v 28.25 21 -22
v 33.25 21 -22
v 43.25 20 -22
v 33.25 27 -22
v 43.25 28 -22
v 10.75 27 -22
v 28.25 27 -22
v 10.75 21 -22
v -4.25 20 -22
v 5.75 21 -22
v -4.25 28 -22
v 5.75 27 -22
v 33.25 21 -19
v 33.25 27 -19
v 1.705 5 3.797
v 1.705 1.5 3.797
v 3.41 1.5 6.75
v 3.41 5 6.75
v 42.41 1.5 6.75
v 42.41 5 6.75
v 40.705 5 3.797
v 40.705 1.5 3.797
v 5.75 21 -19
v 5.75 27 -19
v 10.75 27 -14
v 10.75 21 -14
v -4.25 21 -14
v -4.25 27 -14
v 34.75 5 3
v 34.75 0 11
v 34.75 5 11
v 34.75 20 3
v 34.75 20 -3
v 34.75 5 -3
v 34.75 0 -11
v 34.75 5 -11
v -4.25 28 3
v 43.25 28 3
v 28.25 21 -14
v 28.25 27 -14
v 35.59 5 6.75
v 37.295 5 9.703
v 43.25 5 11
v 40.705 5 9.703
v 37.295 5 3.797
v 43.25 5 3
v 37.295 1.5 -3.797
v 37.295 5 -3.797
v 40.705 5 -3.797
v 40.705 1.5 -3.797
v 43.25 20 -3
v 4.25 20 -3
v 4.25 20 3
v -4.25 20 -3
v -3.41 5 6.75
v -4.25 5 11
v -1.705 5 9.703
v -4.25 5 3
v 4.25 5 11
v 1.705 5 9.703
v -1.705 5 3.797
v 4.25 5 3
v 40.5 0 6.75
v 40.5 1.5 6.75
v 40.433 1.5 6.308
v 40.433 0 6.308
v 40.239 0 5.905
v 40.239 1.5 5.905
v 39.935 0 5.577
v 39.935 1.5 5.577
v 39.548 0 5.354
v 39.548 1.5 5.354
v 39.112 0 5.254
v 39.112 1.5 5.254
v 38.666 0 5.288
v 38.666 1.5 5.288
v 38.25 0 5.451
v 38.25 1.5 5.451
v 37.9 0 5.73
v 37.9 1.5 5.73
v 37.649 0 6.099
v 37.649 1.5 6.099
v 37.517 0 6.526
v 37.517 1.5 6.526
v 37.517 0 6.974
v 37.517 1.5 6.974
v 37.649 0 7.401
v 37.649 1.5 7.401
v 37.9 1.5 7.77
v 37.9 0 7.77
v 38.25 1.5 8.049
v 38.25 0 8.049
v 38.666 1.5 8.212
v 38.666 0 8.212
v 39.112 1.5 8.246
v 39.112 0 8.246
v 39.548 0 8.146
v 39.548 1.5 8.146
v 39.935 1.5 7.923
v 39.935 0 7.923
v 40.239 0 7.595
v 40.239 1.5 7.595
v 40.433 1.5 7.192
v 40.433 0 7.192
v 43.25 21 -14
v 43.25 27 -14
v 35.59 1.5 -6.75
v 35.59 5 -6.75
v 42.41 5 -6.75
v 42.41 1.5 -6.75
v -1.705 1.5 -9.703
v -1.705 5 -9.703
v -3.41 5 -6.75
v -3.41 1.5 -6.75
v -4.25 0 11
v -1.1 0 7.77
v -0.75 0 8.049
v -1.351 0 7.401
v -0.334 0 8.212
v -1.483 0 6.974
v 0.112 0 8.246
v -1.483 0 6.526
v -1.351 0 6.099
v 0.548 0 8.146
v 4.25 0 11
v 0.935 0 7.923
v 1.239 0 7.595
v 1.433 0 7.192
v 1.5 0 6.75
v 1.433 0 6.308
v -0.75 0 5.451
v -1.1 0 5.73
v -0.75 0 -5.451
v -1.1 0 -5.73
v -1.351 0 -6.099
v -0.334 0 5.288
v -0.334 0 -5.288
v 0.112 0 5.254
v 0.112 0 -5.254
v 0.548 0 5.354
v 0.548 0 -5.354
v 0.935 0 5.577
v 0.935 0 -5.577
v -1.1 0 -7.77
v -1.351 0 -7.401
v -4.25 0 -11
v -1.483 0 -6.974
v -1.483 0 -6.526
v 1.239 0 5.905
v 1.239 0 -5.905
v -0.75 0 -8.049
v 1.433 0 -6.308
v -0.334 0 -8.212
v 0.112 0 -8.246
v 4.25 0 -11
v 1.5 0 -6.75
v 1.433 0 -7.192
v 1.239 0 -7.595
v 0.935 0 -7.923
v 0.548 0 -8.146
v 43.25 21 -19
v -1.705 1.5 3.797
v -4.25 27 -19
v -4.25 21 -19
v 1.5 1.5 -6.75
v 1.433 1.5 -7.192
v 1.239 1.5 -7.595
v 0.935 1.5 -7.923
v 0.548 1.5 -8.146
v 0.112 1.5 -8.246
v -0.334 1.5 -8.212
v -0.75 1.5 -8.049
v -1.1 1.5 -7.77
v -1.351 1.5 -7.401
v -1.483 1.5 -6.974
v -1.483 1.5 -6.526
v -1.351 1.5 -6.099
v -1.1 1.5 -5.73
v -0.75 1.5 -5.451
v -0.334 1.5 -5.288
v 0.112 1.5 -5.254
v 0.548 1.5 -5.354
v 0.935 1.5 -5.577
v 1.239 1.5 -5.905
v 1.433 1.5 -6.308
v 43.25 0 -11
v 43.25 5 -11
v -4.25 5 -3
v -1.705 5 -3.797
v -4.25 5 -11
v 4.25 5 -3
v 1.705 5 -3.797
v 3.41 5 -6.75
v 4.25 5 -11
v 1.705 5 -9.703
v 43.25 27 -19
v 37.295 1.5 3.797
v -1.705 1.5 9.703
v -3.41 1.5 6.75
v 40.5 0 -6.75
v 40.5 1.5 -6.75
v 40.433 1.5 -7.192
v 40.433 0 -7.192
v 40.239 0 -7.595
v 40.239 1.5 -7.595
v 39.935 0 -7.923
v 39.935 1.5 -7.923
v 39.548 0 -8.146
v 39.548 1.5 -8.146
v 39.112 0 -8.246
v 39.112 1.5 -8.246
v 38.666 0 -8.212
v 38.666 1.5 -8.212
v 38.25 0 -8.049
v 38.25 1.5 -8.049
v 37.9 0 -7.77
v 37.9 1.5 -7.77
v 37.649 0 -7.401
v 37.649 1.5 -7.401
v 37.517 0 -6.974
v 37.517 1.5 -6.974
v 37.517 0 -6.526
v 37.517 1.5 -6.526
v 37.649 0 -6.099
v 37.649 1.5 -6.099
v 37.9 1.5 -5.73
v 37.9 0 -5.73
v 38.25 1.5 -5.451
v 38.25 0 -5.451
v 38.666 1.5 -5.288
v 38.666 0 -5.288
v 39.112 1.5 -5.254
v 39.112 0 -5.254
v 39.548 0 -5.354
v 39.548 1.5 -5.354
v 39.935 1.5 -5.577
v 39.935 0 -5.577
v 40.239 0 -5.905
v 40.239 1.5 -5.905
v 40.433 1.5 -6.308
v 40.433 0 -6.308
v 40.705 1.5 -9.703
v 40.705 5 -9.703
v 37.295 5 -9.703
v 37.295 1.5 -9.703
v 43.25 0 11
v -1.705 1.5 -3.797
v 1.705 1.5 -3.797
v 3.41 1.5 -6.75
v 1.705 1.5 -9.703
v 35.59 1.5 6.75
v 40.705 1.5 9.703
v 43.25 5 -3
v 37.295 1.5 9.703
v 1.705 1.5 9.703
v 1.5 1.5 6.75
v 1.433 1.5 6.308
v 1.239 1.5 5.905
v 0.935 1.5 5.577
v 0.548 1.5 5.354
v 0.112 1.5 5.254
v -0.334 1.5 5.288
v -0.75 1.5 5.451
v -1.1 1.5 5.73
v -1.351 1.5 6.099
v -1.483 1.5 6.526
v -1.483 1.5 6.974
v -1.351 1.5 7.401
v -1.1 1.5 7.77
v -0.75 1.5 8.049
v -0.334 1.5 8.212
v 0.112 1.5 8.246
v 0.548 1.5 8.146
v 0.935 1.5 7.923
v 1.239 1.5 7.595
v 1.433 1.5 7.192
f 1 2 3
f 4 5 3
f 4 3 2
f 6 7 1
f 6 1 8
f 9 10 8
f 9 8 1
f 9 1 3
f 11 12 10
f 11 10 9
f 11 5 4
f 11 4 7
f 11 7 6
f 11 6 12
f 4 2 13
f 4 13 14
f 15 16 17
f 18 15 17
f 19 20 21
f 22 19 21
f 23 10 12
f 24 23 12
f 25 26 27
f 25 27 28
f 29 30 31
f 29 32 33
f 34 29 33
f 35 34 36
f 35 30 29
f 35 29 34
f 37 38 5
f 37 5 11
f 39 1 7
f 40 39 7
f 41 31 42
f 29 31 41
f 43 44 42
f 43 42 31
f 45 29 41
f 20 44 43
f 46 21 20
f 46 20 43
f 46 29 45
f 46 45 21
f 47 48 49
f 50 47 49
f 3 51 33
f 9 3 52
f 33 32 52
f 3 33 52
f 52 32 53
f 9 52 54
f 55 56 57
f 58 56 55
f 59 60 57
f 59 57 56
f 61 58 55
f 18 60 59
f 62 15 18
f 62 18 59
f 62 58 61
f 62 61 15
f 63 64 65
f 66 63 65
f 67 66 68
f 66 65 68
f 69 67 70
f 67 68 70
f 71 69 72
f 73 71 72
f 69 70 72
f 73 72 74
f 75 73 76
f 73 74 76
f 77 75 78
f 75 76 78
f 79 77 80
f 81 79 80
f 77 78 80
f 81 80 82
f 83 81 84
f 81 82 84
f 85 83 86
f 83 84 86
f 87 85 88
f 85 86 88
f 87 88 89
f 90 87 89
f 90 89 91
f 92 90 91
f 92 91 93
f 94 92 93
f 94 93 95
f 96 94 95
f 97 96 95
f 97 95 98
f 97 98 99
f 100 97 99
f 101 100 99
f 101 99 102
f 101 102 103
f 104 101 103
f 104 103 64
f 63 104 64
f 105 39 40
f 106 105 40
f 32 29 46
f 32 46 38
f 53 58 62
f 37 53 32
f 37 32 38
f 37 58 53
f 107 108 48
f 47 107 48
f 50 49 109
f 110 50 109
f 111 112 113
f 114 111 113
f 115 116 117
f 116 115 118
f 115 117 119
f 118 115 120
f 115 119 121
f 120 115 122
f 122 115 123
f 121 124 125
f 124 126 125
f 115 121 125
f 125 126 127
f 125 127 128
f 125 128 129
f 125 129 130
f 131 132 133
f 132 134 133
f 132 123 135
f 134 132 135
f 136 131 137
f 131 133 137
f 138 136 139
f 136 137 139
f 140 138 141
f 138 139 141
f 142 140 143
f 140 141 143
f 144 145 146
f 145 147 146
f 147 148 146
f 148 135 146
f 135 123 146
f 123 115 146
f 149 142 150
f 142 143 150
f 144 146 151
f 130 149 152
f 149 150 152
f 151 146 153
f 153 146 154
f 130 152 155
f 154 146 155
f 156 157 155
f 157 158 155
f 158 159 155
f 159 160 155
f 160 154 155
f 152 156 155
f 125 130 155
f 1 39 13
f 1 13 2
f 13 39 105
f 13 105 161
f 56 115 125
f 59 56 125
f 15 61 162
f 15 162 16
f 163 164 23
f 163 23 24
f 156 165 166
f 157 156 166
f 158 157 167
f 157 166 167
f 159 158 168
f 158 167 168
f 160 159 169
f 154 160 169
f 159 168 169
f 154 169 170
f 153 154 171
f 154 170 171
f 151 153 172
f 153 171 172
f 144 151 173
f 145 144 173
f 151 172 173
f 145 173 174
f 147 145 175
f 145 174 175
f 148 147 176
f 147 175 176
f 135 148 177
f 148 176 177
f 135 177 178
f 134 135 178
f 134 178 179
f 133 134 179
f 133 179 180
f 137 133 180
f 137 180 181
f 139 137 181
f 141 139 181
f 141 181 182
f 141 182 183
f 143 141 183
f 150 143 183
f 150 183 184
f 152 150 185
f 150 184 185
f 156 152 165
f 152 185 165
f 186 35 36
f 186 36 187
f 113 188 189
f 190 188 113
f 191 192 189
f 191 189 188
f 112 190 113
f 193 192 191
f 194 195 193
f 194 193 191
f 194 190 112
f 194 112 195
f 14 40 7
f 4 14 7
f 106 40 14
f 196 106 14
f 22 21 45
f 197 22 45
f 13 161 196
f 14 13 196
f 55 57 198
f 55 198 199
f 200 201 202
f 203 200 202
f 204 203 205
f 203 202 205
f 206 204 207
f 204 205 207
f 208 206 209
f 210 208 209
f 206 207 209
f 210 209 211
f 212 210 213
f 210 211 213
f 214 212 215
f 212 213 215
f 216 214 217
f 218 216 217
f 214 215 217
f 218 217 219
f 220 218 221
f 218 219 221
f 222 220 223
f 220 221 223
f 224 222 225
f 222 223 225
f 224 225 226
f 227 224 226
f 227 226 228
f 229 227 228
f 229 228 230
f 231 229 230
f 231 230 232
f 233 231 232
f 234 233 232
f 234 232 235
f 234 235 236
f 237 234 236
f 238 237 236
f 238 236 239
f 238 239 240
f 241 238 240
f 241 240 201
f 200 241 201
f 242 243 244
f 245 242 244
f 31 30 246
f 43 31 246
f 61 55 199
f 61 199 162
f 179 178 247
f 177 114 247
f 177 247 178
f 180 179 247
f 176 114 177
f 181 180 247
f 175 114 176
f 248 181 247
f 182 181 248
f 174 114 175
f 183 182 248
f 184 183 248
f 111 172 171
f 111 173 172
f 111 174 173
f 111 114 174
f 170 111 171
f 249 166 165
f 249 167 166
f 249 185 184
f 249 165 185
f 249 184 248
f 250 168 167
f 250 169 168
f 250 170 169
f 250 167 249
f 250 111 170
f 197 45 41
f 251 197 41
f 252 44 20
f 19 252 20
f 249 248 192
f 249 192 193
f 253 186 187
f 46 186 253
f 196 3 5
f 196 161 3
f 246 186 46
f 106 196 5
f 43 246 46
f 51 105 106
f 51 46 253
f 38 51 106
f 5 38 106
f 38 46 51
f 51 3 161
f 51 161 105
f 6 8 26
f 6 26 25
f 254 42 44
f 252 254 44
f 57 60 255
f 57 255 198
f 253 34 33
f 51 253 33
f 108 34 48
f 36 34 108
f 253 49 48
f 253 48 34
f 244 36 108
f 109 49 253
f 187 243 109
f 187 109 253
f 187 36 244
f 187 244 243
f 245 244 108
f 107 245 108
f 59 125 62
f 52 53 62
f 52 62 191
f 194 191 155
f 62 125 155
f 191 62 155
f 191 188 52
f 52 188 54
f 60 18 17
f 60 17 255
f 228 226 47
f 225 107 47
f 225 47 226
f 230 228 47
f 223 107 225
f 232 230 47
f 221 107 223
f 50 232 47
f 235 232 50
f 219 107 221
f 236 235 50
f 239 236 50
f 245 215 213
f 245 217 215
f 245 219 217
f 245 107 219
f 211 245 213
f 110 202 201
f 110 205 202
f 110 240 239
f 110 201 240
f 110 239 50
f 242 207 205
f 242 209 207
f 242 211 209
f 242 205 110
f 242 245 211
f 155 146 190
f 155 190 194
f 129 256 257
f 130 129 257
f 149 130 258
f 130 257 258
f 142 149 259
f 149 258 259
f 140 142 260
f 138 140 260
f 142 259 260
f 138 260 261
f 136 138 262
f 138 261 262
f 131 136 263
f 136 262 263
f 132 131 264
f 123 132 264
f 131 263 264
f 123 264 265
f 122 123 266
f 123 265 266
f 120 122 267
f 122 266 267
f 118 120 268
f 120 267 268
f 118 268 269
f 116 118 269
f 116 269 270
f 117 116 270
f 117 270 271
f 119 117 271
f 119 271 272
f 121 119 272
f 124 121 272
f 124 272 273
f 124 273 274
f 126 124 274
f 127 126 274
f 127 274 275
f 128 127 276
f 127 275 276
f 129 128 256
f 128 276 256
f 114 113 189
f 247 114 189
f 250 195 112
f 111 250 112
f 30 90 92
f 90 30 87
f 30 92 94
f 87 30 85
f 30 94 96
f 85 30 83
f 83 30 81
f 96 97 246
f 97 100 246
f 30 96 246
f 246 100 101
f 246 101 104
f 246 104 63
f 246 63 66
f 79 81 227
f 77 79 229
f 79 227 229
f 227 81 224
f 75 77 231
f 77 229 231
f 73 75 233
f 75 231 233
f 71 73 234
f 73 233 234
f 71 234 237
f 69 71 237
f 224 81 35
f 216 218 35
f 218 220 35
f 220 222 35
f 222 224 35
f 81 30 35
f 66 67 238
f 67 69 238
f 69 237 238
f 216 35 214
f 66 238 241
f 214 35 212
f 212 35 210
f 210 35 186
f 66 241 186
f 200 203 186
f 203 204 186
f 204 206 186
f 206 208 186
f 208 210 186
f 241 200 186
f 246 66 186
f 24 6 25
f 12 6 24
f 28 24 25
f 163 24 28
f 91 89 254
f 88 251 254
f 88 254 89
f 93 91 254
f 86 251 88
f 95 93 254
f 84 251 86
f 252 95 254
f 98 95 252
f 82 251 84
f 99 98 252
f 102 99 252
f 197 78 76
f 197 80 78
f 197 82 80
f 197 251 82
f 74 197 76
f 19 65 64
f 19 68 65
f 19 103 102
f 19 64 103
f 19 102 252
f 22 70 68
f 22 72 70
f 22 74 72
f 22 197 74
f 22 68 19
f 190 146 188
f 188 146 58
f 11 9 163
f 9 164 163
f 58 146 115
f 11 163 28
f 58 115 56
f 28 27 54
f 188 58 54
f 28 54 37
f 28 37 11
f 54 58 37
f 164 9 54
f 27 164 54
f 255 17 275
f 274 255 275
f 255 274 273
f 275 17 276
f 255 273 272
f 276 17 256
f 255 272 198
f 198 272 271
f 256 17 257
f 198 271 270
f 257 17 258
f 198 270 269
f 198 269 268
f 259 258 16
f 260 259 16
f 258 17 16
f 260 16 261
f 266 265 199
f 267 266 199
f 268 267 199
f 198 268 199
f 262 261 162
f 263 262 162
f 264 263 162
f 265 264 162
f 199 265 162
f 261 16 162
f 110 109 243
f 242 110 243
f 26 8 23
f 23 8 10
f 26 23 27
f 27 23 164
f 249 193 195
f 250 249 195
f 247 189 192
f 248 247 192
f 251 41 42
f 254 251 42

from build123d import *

# Parameters (mm, degrees)
SKETCH1_W           = 8.5
SKETCH1_H           = 22
BOSS_EXTRUDE1_DEPTH = 5
CUT_EXTRUDE1_DEPTH  = 3.5
SKETCH3_R           = 1.5
CUT_EXTRUDE2_DEPTH  = 1.5
SKETCH4_W           = 8.5
SKETCH4_H           = 6
BOSS_EXTRUDE2_DEPTH = 23
SKETCH7_W           = 8.5
SKETCH7_H           = 22
BOSS_EXTRUDE4_DEPTH = 5
CUT_EXTRUDE3_DEPTH  = 3.5
SKETCH9_R           = 1.5
CUT_EXTRUDE4_DEPTH  = 3.5
SKETCH10_W          = 8.5
SKETCH10_H          = 6
BOSS_EXTRUDE5_DEPTH = 23
SKETCH6_W           = 6
SKETCH6_H           = 8
BOSS_EXTRUDE6_DEPTH = 30.5
SKETCH11_W          = 47.5
SKETCH11_H          = 8
BOSS_EXTRUDE7_DEPTH = 13.5
SKETCH12_W          = 47.5
SKETCH12_H          = 8
BOSS_EXTRUDE8_DEPTH = 5.5
SKETCH13_W          = 5
SKETCH13_H          = 6
CUT_EXTRUDE5_DEPTH  = 15
SKETCH14_W          = 5
SKETCH14_H          = 6
CUT_EXTRUDE6_DEPTH  = 4
SKETCH15_W          = 5
SKETCH15_H          = 6
CUT_EXTRUDE7_DEPTH  = 15
SKETCH16_W          = 5
SKETCH16_H          = 6
CUT_EXTRUDE8_DEPTH  = 4


with BuildPart() as part:
    # Sketch1 → Boss-Extrude1 (new body)
    with BuildSketch(Plane(origin=(0, 0, 0), x_dir=(1, 0, 0), z_dir=(0, 1, 0))):
        Rectangle(SKETCH1_W, SKETCH1_H)
    extrude(amount=BOSS_EXTRUDE1_DEPTH)

    # Sketch2 → Cut-Extrude1 (cut)
    with BuildSketch(Plane(origin=(0, 5, 0), x_dir=(1, 0, 0), z_dir=(0, 1, 0))):
        Polygon((-1.705, 9.703146627), (-3.41, 6.75), (-1.705, 3.796853373), (1.705, 3.796853373), (3.41, 6.75), (1.705, 9.703146627), align=None)
        Polygon((1.705, -9.703146627), (-1.705, -9.703146627), (-3.41, -6.75), (-1.705, -3.796853373), (1.705, -3.796853373), (3.41, -6.75), align=None)
    extrude(amount=-CUT_EXTRUDE1_DEPTH, mode=Mode.SUBTRACT)

    # Sketch3 → Cut-Extrude2 (cut)
    with BuildSketch(Plane(origin=(0, 1.5, 0), x_dir=(1, 0, 0), z_dir=(0, 1, 0))):
        with Locations((0, 6.75)):
            Circle(SKETCH3_R)
        with Locations((0, -6.75)):
            Circle(SKETCH3_R)
        with Locations((39, 6.75)):
            Circle(SKETCH3_R)
        with Locations((39, -6.75)):
            Circle(SKETCH3_R)
    extrude(amount=-CUT_EXTRUDE2_DEPTH, mode=Mode.SUBTRACT)

    # Sketch4 → Boss-Extrude2 (add)
    with BuildSketch(Plane(origin=(0, 5, 0), x_dir=(1, 0, 0), z_dir=(0, 1, 0))):
        Rectangle(SKETCH4_W, SKETCH4_H)
    extrude(amount=BOSS_EXTRUDE2_DEPTH)



with BuildPart() as body_2:
    # Sketch7 → Boss-Extrude4 (new body)
    with BuildSketch(Plane(origin=(0, 0, 0), x_dir=(1, 0, 0), z_dir=(0, 1, 0))):
        with Locations((39, 0)):
            Rectangle(SKETCH7_W, SKETCH7_H)
    extrude(amount=BOSS_EXTRUDE4_DEPTH)

    # Sketch8 → Cut-Extrude3 (cut)
    with BuildSketch(Plane(origin=(0, 5, 0), x_dir=(1, 0, 0), z_dir=(0, 1, 0))):
        Polygon((40.705, 9.703146627), (37.295, 9.703146627), (35.59, 6.75), (37.295, 3.796853373), (40.705, 3.796853373), (42.41, 6.75), align=None)
        Polygon((40.705, -3.796853373), (37.295, -3.796853373), (35.59, -6.75), (37.295, -9.703146627), (40.705, -9.703146627), (42.41, -6.75), align=None)
    extrude(amount=-CUT_EXTRUDE3_DEPTH, mode=Mode.SUBTRACT)

    # Sketch9 → Cut-Extrude4 (cut)
    with BuildSketch(Plane(origin=(0, 1.5, 0), x_dir=(1, 0, 0), z_dir=(0, 1, 0))):
        with Locations((39, 6.75)):
            Circle(SKETCH9_R)
        with Locations((39, -6.75)):
            Circle(SKETCH9_R)
    extrude(amount=-CUT_EXTRUDE4_DEPTH, mode=Mode.SUBTRACT)

    # Sketch10 → Boss-Extrude5 (add)
    with BuildSketch(Plane(origin=(0, 5, 0), x_dir=(1, 0, 0), z_dir=(0, 1, 0))):
        with Locations((39, 0)):
            Rectangle(SKETCH10_W, SKETCH10_H)
    extrude(amount=BOSS_EXTRUDE5_DEPTH)


with BuildPart() as part_1:
    add(part.part)

    add(body_2.part)  # Boss-Extrude6 merges body 2
    # Sketch6 → Boss-Extrude6 (add)
    with BuildSketch(Plane(origin=(4.25, 0, 0), x_dir=(0, 0, -1), z_dir=(1, 0, 0))):
        with Locations((0, 24)):
            Rectangle(SKETCH6_W, SKETCH6_H)
    extrude(amount=BOSS_EXTRUDE6_DEPTH)

    # Sketch11 → Boss-Extrude7 (add)
    with BuildSketch(Plane(origin=(0, 0, -3), x_dir=(-1, 0, 0), z_dir=(0, 0, -1))):
        with Locations((-19.5, 24)):
            Rectangle(SKETCH11_W, SKETCH11_H)
    extrude(amount=BOSS_EXTRUDE7_DEPTH)

    # Sketch12 → Boss-Extrude8 (add)
    with BuildSketch(Plane(origin=(0, 0, -16.5), x_dir=(-1, 0, 0), z_dir=(0, 0, -1))):
        with Locations((-19.5, 24)):
            Rectangle(SKETCH12_W, SKETCH12_H)
    extrude(amount=BOSS_EXTRUDE8_DEPTH)

    # Sketch13 → Cut-Extrude5 (cut)
    with BuildSketch(Plane.ZY.offset(4.25)):
        with Locations((-16.5, 24)):
            Rectangle(SKETCH13_W, SKETCH13_H)
    extrude(amount=-CUT_EXTRUDE5_DEPTH, mode=Mode.SUBTRACT)

    # Sketch14 → Cut-Extrude6 (cut)
    with BuildSketch(Plane(origin=(0, 0, -22), x_dir=(-1, 0, 0), z_dir=(0, 0, -1))):
        with Locations((-8.25, 24)):
            Rectangle(SKETCH14_W, SKETCH14_H)
    extrude(amount=-CUT_EXTRUDE6_DEPTH, mode=Mode.SUBTRACT)

    # Sketch15 → Cut-Extrude7 (cut)
    with BuildSketch(Plane(origin=(43.25, 0, 0), x_dir=(0, 0, -1), z_dir=(1, 0, 0))):
        with Locations((16.5, 24)):
            Rectangle(SKETCH15_W, SKETCH15_H)
    extrude(amount=-CUT_EXTRUDE7_DEPTH, mode=Mode.SUBTRACT)

    # Sketch16 → Cut-Extrude8 (cut)
    with BuildSketch(Plane(origin=(0, 0, -22), x_dir=(-1, 0, 0), z_dir=(0, 0, -1))):
        with Locations((-30.75, 24)):
            Rectangle(SKETCH16_W, SKETCH16_H)
    extrude(amount=-CUT_EXTRUDE8_DEPTH, mode=Mode.SUBTRACT)


solid = part_1.part
